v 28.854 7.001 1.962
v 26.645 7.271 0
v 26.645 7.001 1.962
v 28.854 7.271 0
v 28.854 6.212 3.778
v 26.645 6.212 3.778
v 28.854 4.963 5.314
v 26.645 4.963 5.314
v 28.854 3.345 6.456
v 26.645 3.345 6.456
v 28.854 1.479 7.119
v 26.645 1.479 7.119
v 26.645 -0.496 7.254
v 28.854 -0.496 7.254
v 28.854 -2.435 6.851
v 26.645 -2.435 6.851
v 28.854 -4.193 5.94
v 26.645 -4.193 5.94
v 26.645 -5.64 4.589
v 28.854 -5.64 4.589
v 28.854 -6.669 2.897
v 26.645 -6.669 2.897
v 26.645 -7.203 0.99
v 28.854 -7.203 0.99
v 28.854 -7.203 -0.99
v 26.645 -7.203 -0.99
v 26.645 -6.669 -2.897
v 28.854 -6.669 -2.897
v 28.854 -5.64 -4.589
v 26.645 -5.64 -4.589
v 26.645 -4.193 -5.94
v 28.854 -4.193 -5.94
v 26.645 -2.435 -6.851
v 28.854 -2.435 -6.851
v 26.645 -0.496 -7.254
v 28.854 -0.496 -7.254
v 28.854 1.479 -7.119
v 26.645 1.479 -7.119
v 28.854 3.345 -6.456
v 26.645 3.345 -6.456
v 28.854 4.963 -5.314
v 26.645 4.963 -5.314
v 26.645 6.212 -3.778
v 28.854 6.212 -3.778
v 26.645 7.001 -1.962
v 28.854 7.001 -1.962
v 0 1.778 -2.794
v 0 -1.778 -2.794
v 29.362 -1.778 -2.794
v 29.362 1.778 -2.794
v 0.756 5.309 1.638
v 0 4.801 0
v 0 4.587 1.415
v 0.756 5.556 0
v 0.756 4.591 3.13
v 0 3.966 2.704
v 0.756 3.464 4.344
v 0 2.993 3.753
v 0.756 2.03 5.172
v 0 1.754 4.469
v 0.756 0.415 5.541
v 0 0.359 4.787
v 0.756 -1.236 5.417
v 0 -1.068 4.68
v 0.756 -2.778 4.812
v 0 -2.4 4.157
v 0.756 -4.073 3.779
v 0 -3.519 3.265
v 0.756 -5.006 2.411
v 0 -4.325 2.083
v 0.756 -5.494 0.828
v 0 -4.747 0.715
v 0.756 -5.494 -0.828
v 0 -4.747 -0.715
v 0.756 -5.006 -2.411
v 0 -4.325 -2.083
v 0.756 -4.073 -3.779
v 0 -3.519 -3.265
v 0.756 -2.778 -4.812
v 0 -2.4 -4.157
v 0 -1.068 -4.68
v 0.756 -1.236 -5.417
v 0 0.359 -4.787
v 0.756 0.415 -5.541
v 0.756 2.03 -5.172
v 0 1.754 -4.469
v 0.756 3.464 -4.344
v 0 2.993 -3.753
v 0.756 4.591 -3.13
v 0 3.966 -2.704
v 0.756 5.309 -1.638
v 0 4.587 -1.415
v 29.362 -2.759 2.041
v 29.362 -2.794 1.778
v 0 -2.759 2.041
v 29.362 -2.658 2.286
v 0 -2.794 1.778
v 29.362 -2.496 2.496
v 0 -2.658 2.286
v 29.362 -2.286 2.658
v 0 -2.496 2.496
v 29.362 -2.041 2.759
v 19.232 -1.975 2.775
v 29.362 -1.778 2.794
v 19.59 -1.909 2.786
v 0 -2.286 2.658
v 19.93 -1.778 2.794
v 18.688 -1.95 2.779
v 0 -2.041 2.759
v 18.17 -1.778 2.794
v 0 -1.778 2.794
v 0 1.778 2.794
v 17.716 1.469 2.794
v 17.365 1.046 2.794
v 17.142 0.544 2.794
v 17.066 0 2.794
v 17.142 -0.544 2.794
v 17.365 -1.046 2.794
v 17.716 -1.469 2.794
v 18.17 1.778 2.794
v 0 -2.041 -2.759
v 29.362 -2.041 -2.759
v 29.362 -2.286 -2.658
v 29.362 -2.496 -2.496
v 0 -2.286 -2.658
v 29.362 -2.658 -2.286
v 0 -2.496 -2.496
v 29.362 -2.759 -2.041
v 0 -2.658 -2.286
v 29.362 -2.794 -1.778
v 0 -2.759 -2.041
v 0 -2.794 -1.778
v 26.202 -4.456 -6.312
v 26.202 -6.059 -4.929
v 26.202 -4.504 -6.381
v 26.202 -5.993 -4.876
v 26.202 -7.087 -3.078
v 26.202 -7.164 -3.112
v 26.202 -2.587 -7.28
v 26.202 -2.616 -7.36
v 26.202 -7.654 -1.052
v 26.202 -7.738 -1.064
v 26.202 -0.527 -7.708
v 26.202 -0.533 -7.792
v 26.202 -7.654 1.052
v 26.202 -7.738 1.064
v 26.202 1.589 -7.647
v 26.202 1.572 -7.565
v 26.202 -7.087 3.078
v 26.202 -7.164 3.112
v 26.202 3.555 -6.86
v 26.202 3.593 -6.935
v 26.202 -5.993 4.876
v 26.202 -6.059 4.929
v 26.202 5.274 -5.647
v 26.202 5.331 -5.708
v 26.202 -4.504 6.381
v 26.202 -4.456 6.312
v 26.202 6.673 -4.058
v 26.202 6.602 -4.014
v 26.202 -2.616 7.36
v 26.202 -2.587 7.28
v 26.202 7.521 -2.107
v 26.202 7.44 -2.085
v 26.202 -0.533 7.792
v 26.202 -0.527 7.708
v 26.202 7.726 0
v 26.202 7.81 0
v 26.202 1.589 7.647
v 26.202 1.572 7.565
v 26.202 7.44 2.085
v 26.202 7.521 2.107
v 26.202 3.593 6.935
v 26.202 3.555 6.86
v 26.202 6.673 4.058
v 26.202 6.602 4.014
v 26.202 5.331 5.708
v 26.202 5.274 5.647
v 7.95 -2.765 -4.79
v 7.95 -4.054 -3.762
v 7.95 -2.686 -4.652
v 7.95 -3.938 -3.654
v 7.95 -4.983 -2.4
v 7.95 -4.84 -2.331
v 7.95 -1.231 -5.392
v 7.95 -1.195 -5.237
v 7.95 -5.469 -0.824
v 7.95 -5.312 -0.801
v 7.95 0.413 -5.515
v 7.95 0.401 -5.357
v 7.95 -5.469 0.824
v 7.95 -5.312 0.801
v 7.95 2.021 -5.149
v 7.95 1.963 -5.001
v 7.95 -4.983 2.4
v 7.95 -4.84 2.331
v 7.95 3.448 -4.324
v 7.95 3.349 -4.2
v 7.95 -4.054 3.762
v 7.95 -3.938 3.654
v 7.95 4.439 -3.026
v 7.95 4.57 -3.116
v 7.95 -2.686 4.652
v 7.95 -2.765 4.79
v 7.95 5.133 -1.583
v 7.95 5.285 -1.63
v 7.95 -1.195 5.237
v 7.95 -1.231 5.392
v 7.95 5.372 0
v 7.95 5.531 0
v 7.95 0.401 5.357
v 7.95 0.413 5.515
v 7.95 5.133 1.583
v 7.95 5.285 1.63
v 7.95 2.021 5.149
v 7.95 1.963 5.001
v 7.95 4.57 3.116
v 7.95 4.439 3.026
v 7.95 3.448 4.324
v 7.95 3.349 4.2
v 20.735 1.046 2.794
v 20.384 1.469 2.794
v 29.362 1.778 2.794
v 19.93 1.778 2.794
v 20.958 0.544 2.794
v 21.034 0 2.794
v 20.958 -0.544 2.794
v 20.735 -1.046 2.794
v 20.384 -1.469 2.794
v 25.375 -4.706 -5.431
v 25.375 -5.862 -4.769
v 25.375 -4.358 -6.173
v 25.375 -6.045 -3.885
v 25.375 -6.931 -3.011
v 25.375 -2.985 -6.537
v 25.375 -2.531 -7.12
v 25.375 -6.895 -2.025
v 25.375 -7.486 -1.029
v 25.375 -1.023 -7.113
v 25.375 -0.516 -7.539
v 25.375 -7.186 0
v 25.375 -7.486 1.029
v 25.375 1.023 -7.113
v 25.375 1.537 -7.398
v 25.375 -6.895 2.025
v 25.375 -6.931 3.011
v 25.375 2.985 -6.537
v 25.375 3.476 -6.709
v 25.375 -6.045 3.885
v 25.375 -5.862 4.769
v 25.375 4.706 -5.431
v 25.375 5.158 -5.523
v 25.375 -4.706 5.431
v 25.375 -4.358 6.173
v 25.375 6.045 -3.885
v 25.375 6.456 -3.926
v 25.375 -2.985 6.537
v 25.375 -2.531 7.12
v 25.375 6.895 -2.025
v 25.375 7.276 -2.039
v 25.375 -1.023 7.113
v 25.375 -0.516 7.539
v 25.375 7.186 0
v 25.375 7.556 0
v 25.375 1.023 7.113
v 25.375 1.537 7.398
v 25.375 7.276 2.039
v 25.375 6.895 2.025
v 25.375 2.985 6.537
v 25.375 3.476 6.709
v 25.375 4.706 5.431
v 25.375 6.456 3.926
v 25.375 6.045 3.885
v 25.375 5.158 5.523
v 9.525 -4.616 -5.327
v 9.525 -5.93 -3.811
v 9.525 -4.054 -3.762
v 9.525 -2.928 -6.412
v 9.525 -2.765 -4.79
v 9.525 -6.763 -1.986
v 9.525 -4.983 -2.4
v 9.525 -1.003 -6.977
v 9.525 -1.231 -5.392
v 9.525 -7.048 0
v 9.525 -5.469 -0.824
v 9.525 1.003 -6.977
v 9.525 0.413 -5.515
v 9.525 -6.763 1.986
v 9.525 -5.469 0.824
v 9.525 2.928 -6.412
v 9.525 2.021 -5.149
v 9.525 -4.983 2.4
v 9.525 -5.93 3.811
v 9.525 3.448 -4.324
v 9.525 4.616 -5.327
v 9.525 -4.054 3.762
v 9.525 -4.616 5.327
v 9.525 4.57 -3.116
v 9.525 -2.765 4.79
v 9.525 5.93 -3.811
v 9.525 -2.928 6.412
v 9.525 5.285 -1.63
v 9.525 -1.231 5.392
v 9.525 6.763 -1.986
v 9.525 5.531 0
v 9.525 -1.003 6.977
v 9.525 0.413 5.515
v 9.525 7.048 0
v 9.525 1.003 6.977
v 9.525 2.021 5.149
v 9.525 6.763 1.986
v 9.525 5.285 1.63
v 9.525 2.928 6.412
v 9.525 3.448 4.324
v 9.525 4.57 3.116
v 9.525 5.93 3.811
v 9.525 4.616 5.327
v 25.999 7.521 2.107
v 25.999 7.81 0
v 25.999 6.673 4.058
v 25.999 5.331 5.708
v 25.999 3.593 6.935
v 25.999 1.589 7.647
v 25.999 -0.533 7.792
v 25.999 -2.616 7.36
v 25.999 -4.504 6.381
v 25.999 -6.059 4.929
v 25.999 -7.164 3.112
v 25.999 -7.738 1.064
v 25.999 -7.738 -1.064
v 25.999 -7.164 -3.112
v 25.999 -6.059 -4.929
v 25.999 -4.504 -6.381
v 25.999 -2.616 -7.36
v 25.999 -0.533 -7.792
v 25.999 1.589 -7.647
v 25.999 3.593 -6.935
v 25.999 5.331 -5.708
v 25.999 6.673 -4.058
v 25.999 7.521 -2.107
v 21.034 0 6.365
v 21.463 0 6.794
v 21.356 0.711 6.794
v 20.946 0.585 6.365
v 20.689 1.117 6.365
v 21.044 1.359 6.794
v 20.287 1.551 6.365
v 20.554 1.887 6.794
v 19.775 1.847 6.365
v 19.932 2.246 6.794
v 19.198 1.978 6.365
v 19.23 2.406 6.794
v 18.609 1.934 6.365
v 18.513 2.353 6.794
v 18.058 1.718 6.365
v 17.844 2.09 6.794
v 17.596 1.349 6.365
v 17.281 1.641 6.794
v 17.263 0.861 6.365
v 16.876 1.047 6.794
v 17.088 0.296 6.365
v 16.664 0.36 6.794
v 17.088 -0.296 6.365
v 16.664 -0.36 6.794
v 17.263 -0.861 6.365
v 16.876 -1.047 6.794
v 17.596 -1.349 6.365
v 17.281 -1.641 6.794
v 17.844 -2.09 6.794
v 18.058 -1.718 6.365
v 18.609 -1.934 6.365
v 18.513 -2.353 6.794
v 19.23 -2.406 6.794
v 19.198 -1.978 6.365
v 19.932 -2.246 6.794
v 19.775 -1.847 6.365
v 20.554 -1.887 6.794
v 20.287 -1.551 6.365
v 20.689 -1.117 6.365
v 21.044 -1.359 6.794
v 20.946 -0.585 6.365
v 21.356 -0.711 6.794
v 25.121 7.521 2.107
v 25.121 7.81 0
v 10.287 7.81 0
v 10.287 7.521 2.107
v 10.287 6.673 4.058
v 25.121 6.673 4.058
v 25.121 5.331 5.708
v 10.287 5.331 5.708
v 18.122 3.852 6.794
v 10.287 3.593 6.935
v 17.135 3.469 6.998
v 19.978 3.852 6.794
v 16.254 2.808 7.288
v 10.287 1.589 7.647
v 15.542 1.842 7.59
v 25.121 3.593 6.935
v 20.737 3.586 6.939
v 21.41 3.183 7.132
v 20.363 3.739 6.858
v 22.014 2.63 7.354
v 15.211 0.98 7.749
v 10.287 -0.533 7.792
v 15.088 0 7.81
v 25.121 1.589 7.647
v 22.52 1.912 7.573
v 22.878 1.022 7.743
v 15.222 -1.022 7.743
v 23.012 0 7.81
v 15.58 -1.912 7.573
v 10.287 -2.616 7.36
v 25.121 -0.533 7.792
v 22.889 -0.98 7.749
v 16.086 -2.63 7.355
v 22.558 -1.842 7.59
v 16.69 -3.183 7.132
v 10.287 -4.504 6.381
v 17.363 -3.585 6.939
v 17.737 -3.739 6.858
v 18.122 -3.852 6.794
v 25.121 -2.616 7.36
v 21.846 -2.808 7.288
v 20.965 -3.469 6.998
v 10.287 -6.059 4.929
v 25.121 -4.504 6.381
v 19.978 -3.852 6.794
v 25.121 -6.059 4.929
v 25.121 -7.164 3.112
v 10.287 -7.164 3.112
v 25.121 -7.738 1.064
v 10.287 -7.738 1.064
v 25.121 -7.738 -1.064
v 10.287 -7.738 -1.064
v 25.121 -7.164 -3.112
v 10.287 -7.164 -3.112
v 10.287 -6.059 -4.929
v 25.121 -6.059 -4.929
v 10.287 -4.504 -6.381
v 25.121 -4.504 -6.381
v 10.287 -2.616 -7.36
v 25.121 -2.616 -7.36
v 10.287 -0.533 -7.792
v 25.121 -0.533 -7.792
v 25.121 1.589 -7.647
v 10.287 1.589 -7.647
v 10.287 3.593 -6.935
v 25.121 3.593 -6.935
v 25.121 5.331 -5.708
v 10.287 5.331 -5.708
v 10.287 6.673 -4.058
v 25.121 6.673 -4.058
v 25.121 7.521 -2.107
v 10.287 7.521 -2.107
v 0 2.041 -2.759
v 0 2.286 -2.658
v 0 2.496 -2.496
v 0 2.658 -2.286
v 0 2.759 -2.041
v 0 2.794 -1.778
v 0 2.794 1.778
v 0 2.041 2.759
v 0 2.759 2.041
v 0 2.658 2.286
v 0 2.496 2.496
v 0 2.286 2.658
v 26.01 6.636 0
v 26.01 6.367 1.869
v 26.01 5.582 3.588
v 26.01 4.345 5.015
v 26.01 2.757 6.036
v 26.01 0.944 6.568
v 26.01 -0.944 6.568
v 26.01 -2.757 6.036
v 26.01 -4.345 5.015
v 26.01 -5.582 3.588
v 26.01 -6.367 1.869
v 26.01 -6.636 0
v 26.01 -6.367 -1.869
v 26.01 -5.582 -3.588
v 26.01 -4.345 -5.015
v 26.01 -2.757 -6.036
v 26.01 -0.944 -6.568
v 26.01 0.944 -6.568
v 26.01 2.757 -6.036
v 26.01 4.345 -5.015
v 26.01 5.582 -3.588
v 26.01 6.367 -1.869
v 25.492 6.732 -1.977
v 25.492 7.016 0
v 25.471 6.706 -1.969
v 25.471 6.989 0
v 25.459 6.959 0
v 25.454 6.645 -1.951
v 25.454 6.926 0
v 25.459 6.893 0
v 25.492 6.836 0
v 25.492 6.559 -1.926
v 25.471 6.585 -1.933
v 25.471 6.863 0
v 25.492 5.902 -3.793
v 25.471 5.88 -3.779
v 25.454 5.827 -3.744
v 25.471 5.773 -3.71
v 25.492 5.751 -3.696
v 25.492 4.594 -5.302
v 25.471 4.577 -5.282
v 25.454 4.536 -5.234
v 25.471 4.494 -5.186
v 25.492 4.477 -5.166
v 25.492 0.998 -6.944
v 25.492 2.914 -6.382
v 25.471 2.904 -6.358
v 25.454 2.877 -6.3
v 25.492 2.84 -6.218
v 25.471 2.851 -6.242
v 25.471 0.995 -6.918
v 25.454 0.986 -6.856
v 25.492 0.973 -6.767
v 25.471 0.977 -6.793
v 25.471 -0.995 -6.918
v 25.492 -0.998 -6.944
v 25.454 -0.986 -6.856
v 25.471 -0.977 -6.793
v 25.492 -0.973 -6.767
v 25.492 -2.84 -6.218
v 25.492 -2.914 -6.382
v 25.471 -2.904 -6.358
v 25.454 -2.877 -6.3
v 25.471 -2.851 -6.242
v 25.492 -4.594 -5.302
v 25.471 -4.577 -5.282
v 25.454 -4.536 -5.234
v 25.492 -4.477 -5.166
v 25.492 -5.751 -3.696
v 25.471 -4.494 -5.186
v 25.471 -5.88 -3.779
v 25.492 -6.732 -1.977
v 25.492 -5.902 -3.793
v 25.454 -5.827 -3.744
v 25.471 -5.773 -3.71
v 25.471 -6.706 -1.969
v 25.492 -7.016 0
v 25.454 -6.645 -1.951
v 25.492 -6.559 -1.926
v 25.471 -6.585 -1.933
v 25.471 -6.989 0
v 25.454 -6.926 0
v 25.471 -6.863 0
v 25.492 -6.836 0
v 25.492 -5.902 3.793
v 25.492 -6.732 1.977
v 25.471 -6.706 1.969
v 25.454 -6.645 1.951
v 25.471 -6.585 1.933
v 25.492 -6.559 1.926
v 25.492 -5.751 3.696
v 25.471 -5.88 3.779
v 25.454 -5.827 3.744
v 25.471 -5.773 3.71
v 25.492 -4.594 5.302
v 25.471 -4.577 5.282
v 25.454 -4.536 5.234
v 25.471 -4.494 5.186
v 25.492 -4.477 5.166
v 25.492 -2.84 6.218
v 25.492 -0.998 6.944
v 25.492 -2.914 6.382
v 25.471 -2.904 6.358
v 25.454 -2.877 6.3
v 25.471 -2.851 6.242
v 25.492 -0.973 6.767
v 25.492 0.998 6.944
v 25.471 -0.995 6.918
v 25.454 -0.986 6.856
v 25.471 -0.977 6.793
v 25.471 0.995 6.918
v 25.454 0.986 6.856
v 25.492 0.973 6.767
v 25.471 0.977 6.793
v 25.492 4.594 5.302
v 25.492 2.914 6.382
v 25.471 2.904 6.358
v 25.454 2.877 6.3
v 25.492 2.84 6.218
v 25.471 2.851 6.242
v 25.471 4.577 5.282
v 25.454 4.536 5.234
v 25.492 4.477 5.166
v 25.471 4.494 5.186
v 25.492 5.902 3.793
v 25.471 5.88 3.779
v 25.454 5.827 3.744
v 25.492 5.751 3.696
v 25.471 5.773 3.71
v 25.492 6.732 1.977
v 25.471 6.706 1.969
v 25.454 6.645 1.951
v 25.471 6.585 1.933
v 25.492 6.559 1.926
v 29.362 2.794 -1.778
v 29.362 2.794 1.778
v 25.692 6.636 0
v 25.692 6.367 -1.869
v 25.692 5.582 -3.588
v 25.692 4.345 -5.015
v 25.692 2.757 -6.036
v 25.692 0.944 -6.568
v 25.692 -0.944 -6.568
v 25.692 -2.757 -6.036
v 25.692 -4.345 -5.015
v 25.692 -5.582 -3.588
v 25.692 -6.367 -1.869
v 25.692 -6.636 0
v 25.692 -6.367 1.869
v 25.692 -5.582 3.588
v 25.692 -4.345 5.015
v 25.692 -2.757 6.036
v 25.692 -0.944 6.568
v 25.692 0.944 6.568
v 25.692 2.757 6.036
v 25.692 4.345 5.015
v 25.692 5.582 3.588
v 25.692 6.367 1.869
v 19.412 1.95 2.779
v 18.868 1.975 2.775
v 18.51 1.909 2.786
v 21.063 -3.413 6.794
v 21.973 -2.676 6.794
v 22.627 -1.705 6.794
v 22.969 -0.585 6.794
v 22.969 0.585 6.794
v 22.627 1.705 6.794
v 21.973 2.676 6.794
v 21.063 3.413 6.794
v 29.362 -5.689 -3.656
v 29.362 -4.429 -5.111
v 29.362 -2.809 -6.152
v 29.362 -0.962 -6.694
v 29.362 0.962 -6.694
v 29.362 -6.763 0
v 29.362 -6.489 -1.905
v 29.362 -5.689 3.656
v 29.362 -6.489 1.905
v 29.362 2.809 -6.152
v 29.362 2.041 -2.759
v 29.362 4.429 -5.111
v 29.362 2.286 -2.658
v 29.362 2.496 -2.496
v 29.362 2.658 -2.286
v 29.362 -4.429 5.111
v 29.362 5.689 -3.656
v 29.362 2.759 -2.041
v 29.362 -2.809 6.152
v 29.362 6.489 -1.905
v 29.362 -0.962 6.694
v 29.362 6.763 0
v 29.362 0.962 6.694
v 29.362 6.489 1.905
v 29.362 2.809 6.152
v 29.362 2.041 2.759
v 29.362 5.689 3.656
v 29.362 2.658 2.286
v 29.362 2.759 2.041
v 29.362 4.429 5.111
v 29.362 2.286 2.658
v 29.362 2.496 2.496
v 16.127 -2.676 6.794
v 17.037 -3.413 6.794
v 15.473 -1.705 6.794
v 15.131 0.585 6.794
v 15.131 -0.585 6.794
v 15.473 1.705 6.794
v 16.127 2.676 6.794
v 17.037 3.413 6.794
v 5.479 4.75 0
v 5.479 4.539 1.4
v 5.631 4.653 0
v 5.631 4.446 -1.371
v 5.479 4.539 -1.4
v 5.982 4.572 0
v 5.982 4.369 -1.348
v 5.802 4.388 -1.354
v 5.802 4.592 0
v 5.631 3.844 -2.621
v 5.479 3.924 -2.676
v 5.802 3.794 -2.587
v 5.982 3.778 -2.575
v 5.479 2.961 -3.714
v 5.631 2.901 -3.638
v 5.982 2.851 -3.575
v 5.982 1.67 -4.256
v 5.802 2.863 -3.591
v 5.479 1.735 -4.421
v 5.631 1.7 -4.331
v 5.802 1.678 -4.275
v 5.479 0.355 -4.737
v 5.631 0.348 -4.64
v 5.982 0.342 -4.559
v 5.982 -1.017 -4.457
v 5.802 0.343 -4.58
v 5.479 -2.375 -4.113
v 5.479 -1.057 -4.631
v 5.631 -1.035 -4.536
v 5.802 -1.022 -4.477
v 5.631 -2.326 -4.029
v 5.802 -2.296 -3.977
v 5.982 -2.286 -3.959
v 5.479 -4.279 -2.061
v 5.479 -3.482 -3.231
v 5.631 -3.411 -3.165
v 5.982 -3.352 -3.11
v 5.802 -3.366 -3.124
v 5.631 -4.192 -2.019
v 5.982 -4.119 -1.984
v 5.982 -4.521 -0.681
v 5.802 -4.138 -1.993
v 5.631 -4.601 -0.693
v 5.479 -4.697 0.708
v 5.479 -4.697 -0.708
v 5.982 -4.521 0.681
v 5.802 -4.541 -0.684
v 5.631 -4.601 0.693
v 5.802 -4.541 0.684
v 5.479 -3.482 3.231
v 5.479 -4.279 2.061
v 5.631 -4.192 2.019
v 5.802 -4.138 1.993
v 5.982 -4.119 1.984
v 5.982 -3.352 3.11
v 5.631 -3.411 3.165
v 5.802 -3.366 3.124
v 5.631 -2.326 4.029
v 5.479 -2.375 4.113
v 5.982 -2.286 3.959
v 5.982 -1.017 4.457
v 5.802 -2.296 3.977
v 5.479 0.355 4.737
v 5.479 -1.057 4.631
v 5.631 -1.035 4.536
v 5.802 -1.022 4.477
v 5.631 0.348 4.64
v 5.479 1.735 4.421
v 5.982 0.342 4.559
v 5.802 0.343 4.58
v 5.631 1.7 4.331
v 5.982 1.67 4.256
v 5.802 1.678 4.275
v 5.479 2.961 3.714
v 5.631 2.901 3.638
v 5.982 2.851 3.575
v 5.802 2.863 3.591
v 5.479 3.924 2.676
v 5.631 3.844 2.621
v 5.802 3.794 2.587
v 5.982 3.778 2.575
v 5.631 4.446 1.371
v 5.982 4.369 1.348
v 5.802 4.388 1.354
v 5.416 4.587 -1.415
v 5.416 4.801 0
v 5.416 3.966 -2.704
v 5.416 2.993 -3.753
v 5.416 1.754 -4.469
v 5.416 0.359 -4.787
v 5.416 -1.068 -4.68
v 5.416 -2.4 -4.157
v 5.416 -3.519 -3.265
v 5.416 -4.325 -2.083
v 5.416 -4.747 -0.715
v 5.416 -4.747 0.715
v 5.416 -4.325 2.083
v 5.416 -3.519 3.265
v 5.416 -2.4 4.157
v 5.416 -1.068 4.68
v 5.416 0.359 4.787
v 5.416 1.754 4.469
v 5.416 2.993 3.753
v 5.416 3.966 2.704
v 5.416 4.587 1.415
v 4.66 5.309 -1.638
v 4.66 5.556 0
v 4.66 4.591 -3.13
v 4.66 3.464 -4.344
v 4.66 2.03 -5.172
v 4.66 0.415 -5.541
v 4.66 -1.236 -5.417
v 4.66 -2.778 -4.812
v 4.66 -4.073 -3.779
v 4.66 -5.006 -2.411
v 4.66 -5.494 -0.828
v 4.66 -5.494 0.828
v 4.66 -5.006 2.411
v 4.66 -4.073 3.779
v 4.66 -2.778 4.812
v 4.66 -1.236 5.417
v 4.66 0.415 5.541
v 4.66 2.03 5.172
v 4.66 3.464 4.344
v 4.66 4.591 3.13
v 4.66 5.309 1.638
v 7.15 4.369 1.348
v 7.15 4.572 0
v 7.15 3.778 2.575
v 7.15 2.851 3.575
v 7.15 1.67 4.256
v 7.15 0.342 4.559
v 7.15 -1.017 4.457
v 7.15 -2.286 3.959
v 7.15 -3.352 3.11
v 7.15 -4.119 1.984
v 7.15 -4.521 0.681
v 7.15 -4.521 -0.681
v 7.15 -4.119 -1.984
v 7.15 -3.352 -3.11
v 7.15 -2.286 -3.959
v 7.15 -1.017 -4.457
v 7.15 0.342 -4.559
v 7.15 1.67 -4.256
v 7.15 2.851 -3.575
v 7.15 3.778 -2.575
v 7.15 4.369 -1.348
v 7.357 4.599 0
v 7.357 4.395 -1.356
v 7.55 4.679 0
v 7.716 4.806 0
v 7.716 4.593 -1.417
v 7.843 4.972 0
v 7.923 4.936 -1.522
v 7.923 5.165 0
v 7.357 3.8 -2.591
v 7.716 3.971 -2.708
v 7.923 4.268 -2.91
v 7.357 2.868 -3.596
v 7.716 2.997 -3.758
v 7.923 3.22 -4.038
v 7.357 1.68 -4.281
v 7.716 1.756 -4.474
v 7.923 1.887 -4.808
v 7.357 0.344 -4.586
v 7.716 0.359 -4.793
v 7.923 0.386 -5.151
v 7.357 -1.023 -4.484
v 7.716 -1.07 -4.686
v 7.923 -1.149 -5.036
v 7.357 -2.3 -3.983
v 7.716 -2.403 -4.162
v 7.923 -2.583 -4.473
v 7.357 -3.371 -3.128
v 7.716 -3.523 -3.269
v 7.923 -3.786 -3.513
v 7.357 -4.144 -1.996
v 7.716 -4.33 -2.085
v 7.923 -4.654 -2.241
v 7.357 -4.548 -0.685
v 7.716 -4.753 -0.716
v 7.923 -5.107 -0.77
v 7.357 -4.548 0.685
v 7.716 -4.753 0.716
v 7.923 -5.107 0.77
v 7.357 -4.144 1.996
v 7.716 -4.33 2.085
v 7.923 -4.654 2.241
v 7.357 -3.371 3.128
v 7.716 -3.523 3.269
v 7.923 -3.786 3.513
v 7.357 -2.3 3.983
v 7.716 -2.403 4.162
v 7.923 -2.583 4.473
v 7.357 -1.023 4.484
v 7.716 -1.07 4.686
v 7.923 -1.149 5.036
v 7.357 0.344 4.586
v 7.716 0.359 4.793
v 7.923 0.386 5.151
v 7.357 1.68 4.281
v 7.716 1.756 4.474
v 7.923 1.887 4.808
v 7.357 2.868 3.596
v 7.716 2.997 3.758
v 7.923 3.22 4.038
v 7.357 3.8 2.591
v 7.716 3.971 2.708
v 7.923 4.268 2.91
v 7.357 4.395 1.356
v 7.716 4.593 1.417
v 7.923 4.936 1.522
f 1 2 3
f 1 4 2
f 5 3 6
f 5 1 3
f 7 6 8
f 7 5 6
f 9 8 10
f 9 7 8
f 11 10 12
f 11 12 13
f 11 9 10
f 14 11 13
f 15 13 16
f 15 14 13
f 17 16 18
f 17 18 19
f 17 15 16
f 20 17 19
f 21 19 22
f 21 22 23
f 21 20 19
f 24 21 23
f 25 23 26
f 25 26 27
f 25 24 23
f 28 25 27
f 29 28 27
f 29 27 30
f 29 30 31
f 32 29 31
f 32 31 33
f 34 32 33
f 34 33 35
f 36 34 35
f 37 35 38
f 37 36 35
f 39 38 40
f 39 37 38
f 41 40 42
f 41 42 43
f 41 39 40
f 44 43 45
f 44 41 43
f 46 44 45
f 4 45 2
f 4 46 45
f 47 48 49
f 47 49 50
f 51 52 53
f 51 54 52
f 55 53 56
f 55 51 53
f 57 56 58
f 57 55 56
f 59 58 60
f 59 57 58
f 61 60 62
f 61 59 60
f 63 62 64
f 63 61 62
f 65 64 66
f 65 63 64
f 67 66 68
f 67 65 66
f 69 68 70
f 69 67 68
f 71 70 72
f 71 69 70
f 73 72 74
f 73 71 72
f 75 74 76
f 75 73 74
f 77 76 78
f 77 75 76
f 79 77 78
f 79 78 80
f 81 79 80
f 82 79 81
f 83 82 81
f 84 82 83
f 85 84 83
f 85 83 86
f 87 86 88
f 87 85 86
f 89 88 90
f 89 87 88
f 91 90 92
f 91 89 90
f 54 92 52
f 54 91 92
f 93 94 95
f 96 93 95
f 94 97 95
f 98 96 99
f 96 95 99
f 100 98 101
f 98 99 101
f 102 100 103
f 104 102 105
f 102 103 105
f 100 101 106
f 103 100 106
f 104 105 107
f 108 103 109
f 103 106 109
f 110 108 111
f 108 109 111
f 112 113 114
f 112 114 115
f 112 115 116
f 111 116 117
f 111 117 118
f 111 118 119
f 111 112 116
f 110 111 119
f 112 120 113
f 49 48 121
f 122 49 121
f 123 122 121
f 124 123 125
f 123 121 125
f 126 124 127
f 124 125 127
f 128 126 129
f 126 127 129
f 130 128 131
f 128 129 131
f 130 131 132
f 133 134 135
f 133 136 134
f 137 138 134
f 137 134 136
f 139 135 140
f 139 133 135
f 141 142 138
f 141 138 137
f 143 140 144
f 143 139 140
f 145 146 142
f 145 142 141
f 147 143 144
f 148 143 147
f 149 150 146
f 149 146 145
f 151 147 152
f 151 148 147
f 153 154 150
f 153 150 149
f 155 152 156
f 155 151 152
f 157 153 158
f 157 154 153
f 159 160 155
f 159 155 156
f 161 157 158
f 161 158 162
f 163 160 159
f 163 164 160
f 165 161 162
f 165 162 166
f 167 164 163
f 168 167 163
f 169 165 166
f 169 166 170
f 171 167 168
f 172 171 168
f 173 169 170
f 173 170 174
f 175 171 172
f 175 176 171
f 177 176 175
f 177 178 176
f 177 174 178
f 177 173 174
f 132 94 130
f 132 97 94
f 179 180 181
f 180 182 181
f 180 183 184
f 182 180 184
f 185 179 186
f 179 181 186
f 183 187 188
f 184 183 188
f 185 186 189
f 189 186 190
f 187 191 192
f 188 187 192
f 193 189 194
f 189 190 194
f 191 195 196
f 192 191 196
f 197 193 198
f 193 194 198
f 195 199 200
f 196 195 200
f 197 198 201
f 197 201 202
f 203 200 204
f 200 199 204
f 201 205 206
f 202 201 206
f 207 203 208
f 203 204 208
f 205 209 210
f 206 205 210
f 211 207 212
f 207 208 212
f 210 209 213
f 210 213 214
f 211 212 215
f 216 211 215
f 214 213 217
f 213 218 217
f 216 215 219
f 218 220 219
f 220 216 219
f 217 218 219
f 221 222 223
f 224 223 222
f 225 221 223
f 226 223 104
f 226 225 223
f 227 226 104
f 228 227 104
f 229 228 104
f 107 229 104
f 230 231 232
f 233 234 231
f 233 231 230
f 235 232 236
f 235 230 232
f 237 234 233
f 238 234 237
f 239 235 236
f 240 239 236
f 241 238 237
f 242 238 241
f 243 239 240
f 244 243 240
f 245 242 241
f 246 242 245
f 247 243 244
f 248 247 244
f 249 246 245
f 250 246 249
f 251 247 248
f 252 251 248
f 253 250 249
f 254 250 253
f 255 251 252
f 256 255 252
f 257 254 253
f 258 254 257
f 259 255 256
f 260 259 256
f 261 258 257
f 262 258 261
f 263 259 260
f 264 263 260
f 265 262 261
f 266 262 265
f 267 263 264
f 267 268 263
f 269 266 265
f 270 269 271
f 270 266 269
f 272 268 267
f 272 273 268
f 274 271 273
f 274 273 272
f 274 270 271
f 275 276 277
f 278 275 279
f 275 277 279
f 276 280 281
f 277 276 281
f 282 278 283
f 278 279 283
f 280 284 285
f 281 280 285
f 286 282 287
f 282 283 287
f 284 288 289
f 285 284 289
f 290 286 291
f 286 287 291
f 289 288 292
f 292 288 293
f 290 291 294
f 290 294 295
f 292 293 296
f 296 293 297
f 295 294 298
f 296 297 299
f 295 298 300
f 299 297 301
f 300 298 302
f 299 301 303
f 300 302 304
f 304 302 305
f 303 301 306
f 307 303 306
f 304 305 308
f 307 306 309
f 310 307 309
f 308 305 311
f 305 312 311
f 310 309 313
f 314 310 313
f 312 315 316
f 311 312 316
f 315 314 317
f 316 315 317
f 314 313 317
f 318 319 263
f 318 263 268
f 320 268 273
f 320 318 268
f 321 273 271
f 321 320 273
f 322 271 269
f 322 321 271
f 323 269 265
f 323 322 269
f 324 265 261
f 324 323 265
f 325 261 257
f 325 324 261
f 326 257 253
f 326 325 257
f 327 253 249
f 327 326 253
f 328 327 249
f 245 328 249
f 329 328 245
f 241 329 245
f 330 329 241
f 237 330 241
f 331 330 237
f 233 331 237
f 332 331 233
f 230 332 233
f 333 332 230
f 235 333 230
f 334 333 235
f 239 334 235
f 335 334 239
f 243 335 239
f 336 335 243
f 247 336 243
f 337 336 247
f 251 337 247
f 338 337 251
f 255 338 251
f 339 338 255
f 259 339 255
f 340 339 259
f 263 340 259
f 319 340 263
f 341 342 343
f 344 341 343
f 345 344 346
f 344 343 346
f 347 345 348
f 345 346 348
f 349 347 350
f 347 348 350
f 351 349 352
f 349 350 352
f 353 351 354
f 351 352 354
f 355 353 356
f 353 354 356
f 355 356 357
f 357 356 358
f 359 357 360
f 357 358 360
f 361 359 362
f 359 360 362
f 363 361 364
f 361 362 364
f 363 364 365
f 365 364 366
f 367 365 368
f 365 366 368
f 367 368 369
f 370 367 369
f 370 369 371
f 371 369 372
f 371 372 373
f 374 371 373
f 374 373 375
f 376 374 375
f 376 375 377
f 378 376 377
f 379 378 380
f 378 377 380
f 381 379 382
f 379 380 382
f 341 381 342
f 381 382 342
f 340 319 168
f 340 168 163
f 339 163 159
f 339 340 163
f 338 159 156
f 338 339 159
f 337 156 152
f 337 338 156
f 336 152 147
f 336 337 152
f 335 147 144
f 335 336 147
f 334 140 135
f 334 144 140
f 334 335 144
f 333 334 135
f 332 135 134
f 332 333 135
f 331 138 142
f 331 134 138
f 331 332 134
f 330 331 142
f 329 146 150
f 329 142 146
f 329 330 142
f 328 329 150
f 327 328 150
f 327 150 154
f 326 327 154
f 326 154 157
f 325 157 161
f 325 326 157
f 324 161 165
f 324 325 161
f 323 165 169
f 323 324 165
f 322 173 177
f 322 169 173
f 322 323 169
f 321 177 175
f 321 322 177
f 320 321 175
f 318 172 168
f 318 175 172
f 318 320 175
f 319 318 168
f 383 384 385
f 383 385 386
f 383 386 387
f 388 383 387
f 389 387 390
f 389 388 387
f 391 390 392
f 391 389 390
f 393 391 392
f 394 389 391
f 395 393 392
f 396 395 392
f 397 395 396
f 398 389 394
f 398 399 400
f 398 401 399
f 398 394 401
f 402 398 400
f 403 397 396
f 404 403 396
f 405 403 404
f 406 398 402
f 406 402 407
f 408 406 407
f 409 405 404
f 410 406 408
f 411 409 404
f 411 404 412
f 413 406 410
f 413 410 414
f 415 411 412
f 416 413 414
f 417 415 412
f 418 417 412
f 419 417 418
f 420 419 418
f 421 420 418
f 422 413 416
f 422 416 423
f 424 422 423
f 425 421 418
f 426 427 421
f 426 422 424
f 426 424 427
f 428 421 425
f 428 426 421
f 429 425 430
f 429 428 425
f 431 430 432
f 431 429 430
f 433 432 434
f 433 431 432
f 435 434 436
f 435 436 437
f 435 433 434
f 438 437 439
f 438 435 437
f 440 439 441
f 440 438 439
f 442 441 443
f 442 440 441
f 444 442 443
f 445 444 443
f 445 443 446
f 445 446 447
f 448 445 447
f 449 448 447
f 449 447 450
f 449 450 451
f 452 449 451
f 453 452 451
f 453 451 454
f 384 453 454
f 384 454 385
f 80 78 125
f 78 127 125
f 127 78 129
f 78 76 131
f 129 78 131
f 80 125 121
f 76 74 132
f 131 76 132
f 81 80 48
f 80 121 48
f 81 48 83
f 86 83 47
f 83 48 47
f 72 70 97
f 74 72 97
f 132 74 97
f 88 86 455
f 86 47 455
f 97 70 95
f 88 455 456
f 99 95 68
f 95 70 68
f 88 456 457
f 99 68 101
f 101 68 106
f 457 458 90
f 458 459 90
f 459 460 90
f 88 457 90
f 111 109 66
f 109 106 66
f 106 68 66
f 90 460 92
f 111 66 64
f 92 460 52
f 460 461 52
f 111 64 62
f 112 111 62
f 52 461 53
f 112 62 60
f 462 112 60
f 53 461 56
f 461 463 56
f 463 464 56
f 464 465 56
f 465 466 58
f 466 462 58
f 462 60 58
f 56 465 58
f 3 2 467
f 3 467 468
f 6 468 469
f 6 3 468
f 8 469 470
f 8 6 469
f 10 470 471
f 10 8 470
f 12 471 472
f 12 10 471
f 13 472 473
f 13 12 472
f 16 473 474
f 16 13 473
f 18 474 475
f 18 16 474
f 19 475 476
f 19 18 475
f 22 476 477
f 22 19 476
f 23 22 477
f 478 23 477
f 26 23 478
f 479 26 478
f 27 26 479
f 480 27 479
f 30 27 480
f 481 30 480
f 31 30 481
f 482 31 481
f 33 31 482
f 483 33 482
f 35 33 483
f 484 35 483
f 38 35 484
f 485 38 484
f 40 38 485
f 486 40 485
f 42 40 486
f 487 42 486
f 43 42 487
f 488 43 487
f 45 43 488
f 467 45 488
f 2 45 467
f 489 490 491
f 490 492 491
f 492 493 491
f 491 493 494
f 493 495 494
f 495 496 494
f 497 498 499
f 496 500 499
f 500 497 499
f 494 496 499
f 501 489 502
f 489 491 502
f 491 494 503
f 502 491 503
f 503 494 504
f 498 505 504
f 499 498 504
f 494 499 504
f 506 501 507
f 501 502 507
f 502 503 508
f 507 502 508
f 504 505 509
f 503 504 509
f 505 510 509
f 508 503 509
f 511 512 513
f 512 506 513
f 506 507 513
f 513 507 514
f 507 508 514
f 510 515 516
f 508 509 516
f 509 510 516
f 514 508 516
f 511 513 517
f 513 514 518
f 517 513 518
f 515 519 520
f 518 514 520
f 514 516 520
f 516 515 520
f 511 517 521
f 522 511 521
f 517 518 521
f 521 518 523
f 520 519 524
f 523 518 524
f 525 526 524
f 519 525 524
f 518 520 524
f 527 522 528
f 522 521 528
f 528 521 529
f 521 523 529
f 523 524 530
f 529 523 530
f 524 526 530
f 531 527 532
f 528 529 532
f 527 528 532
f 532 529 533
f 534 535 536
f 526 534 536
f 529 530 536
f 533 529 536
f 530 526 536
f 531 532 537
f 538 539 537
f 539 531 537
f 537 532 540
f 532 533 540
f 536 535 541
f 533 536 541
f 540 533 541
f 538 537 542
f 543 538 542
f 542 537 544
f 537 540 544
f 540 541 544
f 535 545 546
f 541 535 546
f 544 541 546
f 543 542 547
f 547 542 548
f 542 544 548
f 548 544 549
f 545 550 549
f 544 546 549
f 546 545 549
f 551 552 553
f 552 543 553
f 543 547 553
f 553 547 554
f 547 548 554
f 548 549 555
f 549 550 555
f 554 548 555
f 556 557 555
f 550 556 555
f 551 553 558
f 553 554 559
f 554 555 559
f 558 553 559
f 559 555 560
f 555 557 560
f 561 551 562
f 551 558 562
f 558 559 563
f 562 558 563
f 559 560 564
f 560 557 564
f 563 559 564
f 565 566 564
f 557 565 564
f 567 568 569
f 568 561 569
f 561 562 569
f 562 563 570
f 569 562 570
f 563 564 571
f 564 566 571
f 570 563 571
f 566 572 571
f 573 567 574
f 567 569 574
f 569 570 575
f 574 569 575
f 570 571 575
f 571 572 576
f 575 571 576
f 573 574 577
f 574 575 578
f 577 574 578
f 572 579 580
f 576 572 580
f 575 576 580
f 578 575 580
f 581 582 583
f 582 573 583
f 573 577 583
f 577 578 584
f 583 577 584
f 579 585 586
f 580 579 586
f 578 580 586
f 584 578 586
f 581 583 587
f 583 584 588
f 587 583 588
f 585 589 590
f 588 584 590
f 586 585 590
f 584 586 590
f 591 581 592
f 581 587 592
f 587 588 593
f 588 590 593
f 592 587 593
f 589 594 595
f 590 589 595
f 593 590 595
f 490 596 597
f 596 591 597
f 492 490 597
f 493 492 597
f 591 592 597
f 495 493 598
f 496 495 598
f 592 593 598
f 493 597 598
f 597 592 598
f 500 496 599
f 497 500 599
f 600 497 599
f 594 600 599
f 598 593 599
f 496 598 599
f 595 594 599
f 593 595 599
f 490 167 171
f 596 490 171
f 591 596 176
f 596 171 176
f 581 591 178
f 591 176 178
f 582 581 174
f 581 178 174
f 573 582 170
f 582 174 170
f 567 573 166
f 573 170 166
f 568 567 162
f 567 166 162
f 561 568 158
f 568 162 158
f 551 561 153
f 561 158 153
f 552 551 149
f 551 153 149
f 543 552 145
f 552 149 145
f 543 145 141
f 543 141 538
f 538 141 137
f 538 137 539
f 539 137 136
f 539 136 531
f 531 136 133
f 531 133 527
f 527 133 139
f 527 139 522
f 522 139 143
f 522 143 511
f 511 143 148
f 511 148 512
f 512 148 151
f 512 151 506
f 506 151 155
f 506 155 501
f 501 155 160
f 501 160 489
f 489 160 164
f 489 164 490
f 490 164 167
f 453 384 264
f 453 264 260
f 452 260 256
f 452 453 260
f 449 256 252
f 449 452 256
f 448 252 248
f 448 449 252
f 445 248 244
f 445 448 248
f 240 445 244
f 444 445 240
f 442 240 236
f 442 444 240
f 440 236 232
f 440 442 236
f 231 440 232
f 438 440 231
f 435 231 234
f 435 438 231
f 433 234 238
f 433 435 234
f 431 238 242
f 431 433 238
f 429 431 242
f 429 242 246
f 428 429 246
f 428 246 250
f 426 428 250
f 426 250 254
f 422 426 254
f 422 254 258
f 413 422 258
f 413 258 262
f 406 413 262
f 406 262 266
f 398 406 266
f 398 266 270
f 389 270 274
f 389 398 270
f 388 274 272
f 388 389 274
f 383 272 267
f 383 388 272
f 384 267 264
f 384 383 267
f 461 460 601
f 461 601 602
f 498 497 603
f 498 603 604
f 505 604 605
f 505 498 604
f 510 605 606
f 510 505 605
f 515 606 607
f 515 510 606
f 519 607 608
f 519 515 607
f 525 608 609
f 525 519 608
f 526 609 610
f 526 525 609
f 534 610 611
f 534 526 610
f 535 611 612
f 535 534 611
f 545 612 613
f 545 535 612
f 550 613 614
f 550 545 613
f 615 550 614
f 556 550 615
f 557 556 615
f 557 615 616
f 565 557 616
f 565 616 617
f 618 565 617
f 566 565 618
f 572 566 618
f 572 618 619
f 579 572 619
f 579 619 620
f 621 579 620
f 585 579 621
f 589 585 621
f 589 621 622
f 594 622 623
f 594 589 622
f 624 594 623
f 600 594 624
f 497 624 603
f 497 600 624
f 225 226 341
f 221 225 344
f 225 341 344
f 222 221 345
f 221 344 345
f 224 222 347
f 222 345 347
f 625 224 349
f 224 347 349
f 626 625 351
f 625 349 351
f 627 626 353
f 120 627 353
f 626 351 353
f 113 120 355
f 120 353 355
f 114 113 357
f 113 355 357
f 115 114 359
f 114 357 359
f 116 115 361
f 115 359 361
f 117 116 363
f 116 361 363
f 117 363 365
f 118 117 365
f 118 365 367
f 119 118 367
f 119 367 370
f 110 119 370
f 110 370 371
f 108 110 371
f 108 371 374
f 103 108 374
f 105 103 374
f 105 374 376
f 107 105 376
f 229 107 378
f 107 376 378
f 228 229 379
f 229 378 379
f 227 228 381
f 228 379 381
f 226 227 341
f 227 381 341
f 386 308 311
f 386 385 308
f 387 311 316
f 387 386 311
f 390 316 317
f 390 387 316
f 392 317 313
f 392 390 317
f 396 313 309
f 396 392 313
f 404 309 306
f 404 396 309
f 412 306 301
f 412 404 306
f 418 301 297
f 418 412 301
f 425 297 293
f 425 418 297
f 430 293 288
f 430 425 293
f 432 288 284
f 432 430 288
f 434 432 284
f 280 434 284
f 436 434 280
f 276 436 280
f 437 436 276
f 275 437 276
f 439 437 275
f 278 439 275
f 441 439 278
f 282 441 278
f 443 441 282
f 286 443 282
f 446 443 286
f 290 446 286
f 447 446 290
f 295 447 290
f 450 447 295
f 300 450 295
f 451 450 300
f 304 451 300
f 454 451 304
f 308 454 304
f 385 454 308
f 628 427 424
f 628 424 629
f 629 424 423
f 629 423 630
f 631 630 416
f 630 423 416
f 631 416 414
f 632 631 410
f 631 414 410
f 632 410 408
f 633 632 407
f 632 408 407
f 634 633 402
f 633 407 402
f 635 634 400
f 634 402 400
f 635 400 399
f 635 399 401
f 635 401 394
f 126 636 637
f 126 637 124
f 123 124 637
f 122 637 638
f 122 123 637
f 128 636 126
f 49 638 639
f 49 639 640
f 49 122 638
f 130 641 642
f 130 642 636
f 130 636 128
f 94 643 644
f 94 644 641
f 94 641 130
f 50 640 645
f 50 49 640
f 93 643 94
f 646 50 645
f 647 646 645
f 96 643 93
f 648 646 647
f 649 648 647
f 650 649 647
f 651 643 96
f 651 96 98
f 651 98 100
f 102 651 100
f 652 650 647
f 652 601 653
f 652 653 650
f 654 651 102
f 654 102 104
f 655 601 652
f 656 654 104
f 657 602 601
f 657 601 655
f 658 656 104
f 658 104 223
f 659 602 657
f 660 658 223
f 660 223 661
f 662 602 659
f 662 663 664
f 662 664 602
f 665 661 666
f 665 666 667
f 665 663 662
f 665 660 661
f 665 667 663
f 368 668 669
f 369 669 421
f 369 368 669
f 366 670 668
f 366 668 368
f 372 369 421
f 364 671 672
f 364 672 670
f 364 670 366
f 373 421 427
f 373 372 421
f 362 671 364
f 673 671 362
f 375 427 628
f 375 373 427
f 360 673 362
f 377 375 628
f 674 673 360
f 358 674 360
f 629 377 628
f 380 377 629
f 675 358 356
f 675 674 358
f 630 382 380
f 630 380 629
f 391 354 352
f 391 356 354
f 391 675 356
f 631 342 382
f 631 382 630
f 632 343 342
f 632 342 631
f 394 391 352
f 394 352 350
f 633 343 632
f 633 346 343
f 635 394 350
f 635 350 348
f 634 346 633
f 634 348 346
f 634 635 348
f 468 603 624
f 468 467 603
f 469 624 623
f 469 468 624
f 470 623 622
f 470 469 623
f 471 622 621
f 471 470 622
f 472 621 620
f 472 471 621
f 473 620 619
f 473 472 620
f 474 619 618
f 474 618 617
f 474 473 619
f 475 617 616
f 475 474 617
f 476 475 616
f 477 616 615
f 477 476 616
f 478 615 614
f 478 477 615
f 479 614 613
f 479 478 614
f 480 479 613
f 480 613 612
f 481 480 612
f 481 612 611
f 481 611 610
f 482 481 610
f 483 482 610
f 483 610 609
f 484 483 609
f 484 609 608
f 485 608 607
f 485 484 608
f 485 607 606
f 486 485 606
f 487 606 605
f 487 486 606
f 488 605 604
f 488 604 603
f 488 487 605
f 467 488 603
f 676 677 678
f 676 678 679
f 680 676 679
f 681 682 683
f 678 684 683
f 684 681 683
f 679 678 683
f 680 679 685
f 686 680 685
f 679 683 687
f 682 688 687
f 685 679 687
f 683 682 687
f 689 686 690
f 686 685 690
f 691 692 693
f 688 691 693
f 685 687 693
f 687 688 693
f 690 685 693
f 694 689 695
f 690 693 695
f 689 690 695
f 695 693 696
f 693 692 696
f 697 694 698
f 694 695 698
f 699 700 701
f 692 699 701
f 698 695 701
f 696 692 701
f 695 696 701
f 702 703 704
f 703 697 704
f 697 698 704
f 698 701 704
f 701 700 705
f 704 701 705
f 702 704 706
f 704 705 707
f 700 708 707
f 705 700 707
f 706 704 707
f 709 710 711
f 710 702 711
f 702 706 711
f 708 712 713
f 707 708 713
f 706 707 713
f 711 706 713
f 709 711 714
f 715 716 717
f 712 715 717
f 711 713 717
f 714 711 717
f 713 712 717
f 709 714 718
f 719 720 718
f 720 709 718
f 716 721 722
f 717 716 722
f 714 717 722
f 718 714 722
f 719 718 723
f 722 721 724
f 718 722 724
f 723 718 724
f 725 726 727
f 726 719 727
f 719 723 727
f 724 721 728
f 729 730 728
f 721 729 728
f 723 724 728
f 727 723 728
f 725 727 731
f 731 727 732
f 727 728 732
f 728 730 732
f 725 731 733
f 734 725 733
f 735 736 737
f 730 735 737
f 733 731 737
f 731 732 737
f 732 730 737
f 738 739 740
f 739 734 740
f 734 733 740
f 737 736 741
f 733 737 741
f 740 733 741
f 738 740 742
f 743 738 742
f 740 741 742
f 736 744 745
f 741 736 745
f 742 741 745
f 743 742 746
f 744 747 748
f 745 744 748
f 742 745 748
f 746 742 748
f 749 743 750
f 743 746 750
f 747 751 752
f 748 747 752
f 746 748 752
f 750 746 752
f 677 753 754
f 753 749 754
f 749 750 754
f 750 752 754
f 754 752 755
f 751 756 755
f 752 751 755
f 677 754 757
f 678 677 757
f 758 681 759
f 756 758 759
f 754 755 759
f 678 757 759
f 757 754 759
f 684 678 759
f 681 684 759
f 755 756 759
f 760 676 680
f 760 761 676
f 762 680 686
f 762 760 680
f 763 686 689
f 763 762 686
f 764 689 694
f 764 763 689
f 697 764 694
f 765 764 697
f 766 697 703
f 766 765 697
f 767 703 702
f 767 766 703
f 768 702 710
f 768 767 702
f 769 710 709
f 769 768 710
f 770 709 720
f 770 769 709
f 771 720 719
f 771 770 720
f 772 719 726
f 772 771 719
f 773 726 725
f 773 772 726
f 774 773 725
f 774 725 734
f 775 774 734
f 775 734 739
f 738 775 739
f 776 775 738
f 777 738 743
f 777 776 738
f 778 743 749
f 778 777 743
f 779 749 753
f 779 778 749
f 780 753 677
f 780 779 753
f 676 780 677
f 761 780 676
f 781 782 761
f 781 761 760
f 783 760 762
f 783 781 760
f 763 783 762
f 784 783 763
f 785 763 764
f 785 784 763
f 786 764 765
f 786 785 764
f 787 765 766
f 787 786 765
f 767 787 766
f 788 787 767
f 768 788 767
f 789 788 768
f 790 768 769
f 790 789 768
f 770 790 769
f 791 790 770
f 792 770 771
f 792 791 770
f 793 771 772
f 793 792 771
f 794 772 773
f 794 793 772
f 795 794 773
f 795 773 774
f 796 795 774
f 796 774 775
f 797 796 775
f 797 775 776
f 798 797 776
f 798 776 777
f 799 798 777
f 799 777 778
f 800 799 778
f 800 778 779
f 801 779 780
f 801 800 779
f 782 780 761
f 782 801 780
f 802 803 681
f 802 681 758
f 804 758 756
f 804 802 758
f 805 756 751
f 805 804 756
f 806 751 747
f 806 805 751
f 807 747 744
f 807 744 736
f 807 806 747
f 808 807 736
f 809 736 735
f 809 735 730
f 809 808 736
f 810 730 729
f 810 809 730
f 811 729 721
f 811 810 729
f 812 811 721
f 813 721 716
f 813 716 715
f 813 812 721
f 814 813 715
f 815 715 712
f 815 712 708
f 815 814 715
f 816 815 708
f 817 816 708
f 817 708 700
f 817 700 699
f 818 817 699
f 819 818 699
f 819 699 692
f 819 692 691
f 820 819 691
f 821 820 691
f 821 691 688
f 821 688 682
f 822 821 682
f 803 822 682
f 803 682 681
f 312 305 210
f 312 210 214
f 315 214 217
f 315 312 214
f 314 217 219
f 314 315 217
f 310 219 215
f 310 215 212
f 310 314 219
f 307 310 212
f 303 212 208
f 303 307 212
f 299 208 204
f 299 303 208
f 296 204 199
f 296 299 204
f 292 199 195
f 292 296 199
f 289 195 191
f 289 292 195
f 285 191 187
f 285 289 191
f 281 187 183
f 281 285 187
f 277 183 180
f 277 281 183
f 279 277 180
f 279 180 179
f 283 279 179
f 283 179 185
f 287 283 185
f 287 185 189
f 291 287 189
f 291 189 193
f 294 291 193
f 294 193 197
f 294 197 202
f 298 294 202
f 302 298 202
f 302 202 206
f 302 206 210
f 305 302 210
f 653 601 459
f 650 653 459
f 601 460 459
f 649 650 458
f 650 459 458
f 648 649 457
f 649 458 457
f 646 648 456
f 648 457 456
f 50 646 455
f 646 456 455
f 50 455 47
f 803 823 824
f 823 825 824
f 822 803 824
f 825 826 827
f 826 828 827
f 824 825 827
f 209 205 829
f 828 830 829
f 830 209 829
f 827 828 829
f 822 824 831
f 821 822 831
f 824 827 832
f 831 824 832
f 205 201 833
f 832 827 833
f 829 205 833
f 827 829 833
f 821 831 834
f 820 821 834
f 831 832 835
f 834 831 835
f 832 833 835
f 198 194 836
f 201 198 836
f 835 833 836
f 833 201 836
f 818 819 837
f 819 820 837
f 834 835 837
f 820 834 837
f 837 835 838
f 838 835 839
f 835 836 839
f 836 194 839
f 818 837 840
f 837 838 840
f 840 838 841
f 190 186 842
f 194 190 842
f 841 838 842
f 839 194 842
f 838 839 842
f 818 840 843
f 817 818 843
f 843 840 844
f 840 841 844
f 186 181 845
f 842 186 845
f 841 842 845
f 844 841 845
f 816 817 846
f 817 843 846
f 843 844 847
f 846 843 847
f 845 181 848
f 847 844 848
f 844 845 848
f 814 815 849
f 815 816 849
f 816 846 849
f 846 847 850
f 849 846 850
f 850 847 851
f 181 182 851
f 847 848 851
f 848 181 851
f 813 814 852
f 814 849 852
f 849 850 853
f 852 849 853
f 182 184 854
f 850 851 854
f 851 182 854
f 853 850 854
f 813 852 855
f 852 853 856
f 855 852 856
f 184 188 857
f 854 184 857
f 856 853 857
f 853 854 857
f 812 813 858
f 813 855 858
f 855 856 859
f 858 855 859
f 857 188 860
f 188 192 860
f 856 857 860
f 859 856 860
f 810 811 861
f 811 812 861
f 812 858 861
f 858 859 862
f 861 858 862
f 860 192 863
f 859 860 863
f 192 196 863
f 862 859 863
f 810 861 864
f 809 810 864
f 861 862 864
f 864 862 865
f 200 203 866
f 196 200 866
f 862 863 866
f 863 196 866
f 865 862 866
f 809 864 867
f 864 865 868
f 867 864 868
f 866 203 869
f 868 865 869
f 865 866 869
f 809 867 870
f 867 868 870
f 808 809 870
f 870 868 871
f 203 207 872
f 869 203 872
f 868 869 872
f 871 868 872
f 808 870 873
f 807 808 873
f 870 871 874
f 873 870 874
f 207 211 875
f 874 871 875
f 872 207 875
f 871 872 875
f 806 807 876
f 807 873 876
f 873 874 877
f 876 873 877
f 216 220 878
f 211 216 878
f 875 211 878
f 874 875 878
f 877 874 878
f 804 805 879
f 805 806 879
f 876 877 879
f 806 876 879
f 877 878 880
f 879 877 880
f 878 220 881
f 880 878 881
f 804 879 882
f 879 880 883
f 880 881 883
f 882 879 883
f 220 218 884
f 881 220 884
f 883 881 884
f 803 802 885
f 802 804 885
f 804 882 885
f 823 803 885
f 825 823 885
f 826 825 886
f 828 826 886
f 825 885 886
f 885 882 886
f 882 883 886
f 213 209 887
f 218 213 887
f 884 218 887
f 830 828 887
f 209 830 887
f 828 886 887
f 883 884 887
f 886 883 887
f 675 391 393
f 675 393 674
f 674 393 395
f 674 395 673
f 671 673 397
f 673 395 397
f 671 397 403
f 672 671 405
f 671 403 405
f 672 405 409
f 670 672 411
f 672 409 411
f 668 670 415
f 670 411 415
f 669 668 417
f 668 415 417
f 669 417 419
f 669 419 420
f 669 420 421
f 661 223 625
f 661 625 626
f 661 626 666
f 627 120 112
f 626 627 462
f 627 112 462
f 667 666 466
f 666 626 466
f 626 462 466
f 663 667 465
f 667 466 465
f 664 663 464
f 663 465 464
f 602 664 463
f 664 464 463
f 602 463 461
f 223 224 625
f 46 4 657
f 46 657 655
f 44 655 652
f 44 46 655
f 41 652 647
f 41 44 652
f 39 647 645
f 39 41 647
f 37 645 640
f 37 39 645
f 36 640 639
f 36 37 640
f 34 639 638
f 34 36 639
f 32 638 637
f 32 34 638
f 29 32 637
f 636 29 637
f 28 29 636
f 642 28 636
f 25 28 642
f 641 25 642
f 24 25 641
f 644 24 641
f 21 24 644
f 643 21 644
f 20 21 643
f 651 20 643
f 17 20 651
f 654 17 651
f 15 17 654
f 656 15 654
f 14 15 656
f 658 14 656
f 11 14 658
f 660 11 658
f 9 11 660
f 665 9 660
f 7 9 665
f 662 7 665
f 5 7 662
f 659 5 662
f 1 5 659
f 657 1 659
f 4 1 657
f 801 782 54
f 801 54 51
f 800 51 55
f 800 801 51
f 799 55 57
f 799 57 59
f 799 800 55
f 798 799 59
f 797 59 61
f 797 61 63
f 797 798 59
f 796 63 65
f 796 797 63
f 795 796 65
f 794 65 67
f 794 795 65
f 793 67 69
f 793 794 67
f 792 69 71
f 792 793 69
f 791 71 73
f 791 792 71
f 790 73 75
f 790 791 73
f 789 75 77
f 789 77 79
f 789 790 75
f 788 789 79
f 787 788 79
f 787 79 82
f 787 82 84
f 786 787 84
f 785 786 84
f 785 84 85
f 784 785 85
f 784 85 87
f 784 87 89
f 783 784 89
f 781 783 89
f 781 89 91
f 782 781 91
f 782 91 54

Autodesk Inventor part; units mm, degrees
sketch "Sketch_2" plane through (0, 0, 0) normal (0, 0, 1) x (1, 0, 0)
  line L0 (9.525, 0) -> (0, 0)
  line L1 (0, 0) -> (0, 4.8006)
  line L2 (0, 4.8006) -> (0.7557, 5.5563)
  line L3 (0.7557, 5.5563) -> (4.6603, 5.5563)
  line L4 (4.6603, 5.5563) -> (5.4159, 4.8006)
  line L5 (5.4159, 4.8006) -> (5.4788, 4.7498)
  arc A0 (5.4788, 4.7498) -> (5.9817, 4.572) centre (5.9817, 5.3721) ccw
  line L6 (5.9817, 4.572) -> (7.1501, 4.572)
  arc A1 (7.1501, 4.572) -> (7.9502, 5.3721) centre (7.1501, 5.3721) ccw
  line L7 (7.9502, 5.3721) -> (7.9502, 5.5309)
  line L8 (7.9502, 5.5309) -> (9.525, 5.5309)
  line L9 (9.525, 5.5309) -> (9.525, 0)
  line L10 (9.525, 0) -> (0, 0)
revolve "Revolution1" add sketch "Sketch_2" angle 360 about axis through (9.525, 0, 0) along (1, 0, 0)
thread "Thread1" size "7/16-20 UNF" class "2A" standard "ANSI Unified Screw Threads" full length
sketch "Sketch_3" plane through (0, 0, 0) normal (0, 0, 1) x (1, 0, 0)
  line L0 (29.3624, 0) -> (9.525, 0)
  line L1 (9.525, 0) -> (9.525, 7.0485)
  line L2 (9.525, 7.0485) -> (10.287, 7.8105)
  line L3 (10.287, 7.8105) -> (25.1206, 7.8105)
  line L4 (25.1206, 7.8105) -> (25.3746, 7.5565)
  line L5 (25.3746, 7.5565) -> (25.3746, 6.6357)
  line L6 (25.3746, 6.6357) -> (26.0096, 6.6357)
  line L7 (26.0096, 6.6357) -> (26.6446, 7.2708)
  line L8 (26.6446, 7.2708) -> (28.8544, 7.2708)
  line L9 (28.8544, 7.2708) -> (29.3624, 6.7627)
  line L10 (29.3624, 6.7627) -> (29.3624, 0)
  line L11 (29.3624, 0) -> (9.525, 0)
revolve "Revolution2" add sketch "Sketch_3" angle 360 about axis through (29.3624, 0, 0) along (1, 0, 0)
sketch "Sketch_12" plane through (0, 0, 0) normal (0, 1, 0) x (-1, 0, 0)
  line L0 (-19.05, 7.8105) -> (-19.05, -1.016)
  line L1 (-19.05, -1.016) -> (-21.0337, -1.016)
  line L2 (-21.0337, -1.016) -> (-21.0337, 6.3652)
  line L3 (-21.0337, 6.3652) -> (-21.463, 6.7945)
  line L4 (-21.463, 6.7945) -> (-23.0124, 6.7945)
  line L5 (-23.0124, 6.7945) -> (-23.0124, 7.8105)
  line L6 (-23.0124, 7.8105) -> (-19.05, 7.8105)
  line L7 (-19.05, 7.8105) -> (-19.05, -1.016)
revolve "Revolution3" cut sketch "Sketch_12" angle 360 about axis through (19.05, 0, 7.8105) along (0, 0, 1)
thread "Thread2" size "10-32 UNF" class "2B" standard "ANSI Unified Screw Threads" length 2.4257 offset 5.3848
sketch "Sketch_47" plane through (0, 0, 0) normal (0, 0, 1) x (1, 0, 0)
  line L0 (26.0096, 0) -> (25.3746, 0)
  line L1 (25.3746, 6.3818) -> (26.0096, 6.3818)
  line L2 (26.0096, 6.3818) -> (26.0096, 6.6357)
  line L3 (26.0096, 6.6357) -> (25.6921, 6.6357)
  line L4 (25.6921, 6.6357) -> (25.4916, 6.8362)
  arc A0 (25.4916, 7.0158) -> (25.4916, 6.8362) centre (25.5814, 6.926) ccw
  line L5 (25.4916, 7.0158) -> (26.2022, 7.7263)
  line L6 (26.2022, 7.7263) -> (26.2022, 7.8105)
  line L7 (26.2022, 7.8105) -> (25.999, 7.8105)
  line L8 (25.999, 7.8105) -> (25.3746, 7.1861)
  line L9 (25.3746, 7.1861) -> (25.3746, 6.3818)
revolve "Revolution4" add sketch "Sketch_47" angle 360 about axis through (26.0096, 0, 0) along (1, 0, 0)
sketch "Sketch_33" plane through (0, 0, 0) normal (1, 0, 0) x (0, 1, 0)
  line L0 (1.778, 2.794) -> (-1.778, 2.794)
  arc A0 (-1.778, 2.794) -> (-2.794, 1.778) centre (-1.778, 1.778) ccw
  line L1 (-2.794, 1.778) -> (-2.794, -1.778)
  arc A1 (-2.794, -1.778) -> (-1.778, -2.794) centre (-1.778, -1.778) ccw
  line L2 (-1.778, -2.794) -> (1.778, -2.794)
  arc A2 (1.778, -2.794) -> (2.794, -1.778) centre (1.778, -1.778) ccw
  line L3 (2.794, -1.778) -> (2.794, 1.778)
  arc A3 (2.794, 1.778) -> (1.778, 2.794) centre (1.778, 1.778) ccw
extrude "Extrusion1" cut sketch "Sketch_33" along normal blind 58.7248
ref_plane "m1_XY" through (0, 5.5563, 0) normal (0, 0, 1) x (1, 0, 0)
ref_plane "m1_YZ" through (0, 5.5563, 0) normal (1, 0, 0) x (0, 1, 0)
ref_plane "m1_ZX" through (0, 5.5563, 0) normal (0, 1, 0) x (0, 0, 1)
ref_plane "m2_XY" through (0, -5.5563, 0) normal (0, 0, 1) x (1, 0, 0)
ref_plane "m2_YZ" through (0, -5.5563, 0) normal (1, 0, 0) x (0, 1, 0)
ref_plane "m2_ZX" through (0, -5.5563, 0) normal (0, 1, 0) x (0, 0, 1)
ref_plane "s1_XY" through (7.9502, 0, 0) normal (0, 0, 1) x (1, 0, 0)
ref_plane "s1_YZ" through (7.9502, 0, 0) normal (1, 0, 0) x (0, 1, 0)
ref_plane "s1_ZX" through (7.9502, 0, 0) normal (0, 1, 0) x (0, 0, 1)
ref_plane "s2_XY" through (9.525, 0, 0) normal (0, 0, 1) x (1, 0, 0)
ref_plane "s2_YZ" through (9.525, 0, 0) normal (1, 0, 0) x (0, 1, 0)
ref_plane "s2_ZX" through (9.525, 0, 0) normal (0, 1, 0) x (0, 0, 1)
ref_plane "dp1_XY" through (9.525, 5.5309, 0) normal (0, 0, 1) x (1, 0, 0)
ref_plane "dp1_YZ" through (9.525, 5.5309, 0) normal (1, 0, 0) x (0, 1, 0)
ref_plane "dp1_ZX" through (9.525, 5.5309, 0) normal (0, 1, 0) x (0, 0, 1)
ref_plane "dp2_XY" through (9.525, -5.5309, 0) normal (0, 0, 1) x (1, 0, 0)
ref_plane "dp2_YZ" through (9.525, -5.5309, 0) normal (1, 0, 0) x (0, 1, 0)
ref_plane "dp2_ZX" through (9.525, -5.5309, 0) normal (0, 1, 0) x (0, 0, 1)
ref_plane "rod_guide_XY" through (0, 0, 0) normal (1, 0, 0) x (0, 0, -1)
ref_plane "rod_guide_YZ" through (0, 0, 0) normal (0, 0, -1) x (0, 1, 0)
ref_plane "rod_guide_ZX" through (0, 0, 0) normal (0, 1, 0) x (1, 0, 0)
ref_plane "to_tube_XY" through (26.0096, 0, 0) normal (1, 0, 0) x (0, 0, -1)
ref_plane "to_tube_YZ" through (26.0096, 0, 0) normal (0, 0, -1) x (0, 1, 0)
ref_plane "to_tube_ZX" through (26.0096, 0, 0) normal (0, 1, 0) x (1, 0, 0)
ref_plane "to_foot_bracket_XY" through (9.525, 0, 0) normal (1, 0, 0) x (0, 0, -1)
ref_plane "to_foot_bracket_YZ" through (9.525, 0, 0) normal (0, 0, -1) x (0, 1, 0)
ref_plane "to_foot_bracket_ZX" through (9.525, 0, 0) normal (0, 1, 0) x (1, 0, 0)
ref_plane "to_nut_XY" through (9.525, 0, 0) normal (1, 0, 0) x (0, 0, -1)
ref_plane "to_nut_YZ" through (9.525, 0, 0) normal (0, 0, -1) x (0, 1, 0)
ref_plane "to_nut_ZX" through (9.525, 0, 0) normal (0, 1, 0) x (1, 0, 0)
ref_plane "to_trunnion_brackets_XY" through (0, 0, 0) normal (0, 1, 0) x (1, 0, 0)
ref_plane "to_trunnion_brackets_YZ" through (0, 0, 0) normal (1, 0, 0) x (0, 0, -1)
ref_plane "to_trunnion_brackets_ZX" through (0, 0, 0) normal (0, 0, -1) x (0, 1, 0)
ref_plane "to_trunnion_brackets1_XY" through (0, 0, 0) normal (0, 1, 0) x (1, 0, 0)
ref_plane "to_trunnion_brackets1_YZ" through (0, 0, 0) normal (1, 0, 0) x (0, 0, -1)
ref_plane "to_trunnion_brackets1_ZX" through (0, 0, 0) normal (0, 0, -1) x (0, 1, 0)
ref_plane "to_trunnion_brackets2_XY" through (0, 0, 0) normal (0, 1, 0) x (1, 0, 0)
ref_plane "to_trunnion_brackets2_YZ" through (0, 0, 0) normal (1, 0, 0) x (0, 0, -1)
ref_plane "to_trunnion_brackets2_ZX" through (0, 0, 0) normal (0, 0, -1) x (0, 1, 0)
ref_plane "t1_XY" through (9.525, 0, 0) normal (1, 0, 0) x (0, 0, -1)
ref_plane "t1_YZ" through (9.525, 0, 0) normal (0, 0, -1) x (0, 1, 0)
ref_plane "t1_ZX" through (9.525, 0, 0) normal (0, 1, 0) x (1, 0, 0)
ref_plane "port_XY" through (19.05, 0, 0) normal (0, 0, 1) x (1, 0, 0)
ref_plane "port_YZ" through (19.05, 0, 0) normal (1, 0, 0) x (0, 1, 0)
ref_plane "port_ZX" through (19.05, 0, 0) normal (0, 1, 0) x (0, 0, 1)
ref_plane "rod_guide_1_XY" through (0, 0, 0) normal (1, 0, 0) x (0, 0, -1)
ref_plane "rod_guide_1_YZ" through (0, 0, 0) normal (0, 0, -1) x (0, 1, 0)
ref_plane "rod_guide_1_ZX" through (0, 0, 0) normal (0, 1, 0) x (1, 0, 0)
ref_plane "rod_guide_11_XY" through (0, 0, 0) normal (1, 0, 0) x (0, 0, -1)
ref_plane "rod_guide_11_YZ" through (0, 0, 0) normal (0, 0, -1) x (0, 1, 0)
ref_plane "rod_guide_11_ZX" through (0, 0, 0) normal (0, 1, 0) x (1, 0, 0)
properties part number "02R0101_NR_rod_guide"
